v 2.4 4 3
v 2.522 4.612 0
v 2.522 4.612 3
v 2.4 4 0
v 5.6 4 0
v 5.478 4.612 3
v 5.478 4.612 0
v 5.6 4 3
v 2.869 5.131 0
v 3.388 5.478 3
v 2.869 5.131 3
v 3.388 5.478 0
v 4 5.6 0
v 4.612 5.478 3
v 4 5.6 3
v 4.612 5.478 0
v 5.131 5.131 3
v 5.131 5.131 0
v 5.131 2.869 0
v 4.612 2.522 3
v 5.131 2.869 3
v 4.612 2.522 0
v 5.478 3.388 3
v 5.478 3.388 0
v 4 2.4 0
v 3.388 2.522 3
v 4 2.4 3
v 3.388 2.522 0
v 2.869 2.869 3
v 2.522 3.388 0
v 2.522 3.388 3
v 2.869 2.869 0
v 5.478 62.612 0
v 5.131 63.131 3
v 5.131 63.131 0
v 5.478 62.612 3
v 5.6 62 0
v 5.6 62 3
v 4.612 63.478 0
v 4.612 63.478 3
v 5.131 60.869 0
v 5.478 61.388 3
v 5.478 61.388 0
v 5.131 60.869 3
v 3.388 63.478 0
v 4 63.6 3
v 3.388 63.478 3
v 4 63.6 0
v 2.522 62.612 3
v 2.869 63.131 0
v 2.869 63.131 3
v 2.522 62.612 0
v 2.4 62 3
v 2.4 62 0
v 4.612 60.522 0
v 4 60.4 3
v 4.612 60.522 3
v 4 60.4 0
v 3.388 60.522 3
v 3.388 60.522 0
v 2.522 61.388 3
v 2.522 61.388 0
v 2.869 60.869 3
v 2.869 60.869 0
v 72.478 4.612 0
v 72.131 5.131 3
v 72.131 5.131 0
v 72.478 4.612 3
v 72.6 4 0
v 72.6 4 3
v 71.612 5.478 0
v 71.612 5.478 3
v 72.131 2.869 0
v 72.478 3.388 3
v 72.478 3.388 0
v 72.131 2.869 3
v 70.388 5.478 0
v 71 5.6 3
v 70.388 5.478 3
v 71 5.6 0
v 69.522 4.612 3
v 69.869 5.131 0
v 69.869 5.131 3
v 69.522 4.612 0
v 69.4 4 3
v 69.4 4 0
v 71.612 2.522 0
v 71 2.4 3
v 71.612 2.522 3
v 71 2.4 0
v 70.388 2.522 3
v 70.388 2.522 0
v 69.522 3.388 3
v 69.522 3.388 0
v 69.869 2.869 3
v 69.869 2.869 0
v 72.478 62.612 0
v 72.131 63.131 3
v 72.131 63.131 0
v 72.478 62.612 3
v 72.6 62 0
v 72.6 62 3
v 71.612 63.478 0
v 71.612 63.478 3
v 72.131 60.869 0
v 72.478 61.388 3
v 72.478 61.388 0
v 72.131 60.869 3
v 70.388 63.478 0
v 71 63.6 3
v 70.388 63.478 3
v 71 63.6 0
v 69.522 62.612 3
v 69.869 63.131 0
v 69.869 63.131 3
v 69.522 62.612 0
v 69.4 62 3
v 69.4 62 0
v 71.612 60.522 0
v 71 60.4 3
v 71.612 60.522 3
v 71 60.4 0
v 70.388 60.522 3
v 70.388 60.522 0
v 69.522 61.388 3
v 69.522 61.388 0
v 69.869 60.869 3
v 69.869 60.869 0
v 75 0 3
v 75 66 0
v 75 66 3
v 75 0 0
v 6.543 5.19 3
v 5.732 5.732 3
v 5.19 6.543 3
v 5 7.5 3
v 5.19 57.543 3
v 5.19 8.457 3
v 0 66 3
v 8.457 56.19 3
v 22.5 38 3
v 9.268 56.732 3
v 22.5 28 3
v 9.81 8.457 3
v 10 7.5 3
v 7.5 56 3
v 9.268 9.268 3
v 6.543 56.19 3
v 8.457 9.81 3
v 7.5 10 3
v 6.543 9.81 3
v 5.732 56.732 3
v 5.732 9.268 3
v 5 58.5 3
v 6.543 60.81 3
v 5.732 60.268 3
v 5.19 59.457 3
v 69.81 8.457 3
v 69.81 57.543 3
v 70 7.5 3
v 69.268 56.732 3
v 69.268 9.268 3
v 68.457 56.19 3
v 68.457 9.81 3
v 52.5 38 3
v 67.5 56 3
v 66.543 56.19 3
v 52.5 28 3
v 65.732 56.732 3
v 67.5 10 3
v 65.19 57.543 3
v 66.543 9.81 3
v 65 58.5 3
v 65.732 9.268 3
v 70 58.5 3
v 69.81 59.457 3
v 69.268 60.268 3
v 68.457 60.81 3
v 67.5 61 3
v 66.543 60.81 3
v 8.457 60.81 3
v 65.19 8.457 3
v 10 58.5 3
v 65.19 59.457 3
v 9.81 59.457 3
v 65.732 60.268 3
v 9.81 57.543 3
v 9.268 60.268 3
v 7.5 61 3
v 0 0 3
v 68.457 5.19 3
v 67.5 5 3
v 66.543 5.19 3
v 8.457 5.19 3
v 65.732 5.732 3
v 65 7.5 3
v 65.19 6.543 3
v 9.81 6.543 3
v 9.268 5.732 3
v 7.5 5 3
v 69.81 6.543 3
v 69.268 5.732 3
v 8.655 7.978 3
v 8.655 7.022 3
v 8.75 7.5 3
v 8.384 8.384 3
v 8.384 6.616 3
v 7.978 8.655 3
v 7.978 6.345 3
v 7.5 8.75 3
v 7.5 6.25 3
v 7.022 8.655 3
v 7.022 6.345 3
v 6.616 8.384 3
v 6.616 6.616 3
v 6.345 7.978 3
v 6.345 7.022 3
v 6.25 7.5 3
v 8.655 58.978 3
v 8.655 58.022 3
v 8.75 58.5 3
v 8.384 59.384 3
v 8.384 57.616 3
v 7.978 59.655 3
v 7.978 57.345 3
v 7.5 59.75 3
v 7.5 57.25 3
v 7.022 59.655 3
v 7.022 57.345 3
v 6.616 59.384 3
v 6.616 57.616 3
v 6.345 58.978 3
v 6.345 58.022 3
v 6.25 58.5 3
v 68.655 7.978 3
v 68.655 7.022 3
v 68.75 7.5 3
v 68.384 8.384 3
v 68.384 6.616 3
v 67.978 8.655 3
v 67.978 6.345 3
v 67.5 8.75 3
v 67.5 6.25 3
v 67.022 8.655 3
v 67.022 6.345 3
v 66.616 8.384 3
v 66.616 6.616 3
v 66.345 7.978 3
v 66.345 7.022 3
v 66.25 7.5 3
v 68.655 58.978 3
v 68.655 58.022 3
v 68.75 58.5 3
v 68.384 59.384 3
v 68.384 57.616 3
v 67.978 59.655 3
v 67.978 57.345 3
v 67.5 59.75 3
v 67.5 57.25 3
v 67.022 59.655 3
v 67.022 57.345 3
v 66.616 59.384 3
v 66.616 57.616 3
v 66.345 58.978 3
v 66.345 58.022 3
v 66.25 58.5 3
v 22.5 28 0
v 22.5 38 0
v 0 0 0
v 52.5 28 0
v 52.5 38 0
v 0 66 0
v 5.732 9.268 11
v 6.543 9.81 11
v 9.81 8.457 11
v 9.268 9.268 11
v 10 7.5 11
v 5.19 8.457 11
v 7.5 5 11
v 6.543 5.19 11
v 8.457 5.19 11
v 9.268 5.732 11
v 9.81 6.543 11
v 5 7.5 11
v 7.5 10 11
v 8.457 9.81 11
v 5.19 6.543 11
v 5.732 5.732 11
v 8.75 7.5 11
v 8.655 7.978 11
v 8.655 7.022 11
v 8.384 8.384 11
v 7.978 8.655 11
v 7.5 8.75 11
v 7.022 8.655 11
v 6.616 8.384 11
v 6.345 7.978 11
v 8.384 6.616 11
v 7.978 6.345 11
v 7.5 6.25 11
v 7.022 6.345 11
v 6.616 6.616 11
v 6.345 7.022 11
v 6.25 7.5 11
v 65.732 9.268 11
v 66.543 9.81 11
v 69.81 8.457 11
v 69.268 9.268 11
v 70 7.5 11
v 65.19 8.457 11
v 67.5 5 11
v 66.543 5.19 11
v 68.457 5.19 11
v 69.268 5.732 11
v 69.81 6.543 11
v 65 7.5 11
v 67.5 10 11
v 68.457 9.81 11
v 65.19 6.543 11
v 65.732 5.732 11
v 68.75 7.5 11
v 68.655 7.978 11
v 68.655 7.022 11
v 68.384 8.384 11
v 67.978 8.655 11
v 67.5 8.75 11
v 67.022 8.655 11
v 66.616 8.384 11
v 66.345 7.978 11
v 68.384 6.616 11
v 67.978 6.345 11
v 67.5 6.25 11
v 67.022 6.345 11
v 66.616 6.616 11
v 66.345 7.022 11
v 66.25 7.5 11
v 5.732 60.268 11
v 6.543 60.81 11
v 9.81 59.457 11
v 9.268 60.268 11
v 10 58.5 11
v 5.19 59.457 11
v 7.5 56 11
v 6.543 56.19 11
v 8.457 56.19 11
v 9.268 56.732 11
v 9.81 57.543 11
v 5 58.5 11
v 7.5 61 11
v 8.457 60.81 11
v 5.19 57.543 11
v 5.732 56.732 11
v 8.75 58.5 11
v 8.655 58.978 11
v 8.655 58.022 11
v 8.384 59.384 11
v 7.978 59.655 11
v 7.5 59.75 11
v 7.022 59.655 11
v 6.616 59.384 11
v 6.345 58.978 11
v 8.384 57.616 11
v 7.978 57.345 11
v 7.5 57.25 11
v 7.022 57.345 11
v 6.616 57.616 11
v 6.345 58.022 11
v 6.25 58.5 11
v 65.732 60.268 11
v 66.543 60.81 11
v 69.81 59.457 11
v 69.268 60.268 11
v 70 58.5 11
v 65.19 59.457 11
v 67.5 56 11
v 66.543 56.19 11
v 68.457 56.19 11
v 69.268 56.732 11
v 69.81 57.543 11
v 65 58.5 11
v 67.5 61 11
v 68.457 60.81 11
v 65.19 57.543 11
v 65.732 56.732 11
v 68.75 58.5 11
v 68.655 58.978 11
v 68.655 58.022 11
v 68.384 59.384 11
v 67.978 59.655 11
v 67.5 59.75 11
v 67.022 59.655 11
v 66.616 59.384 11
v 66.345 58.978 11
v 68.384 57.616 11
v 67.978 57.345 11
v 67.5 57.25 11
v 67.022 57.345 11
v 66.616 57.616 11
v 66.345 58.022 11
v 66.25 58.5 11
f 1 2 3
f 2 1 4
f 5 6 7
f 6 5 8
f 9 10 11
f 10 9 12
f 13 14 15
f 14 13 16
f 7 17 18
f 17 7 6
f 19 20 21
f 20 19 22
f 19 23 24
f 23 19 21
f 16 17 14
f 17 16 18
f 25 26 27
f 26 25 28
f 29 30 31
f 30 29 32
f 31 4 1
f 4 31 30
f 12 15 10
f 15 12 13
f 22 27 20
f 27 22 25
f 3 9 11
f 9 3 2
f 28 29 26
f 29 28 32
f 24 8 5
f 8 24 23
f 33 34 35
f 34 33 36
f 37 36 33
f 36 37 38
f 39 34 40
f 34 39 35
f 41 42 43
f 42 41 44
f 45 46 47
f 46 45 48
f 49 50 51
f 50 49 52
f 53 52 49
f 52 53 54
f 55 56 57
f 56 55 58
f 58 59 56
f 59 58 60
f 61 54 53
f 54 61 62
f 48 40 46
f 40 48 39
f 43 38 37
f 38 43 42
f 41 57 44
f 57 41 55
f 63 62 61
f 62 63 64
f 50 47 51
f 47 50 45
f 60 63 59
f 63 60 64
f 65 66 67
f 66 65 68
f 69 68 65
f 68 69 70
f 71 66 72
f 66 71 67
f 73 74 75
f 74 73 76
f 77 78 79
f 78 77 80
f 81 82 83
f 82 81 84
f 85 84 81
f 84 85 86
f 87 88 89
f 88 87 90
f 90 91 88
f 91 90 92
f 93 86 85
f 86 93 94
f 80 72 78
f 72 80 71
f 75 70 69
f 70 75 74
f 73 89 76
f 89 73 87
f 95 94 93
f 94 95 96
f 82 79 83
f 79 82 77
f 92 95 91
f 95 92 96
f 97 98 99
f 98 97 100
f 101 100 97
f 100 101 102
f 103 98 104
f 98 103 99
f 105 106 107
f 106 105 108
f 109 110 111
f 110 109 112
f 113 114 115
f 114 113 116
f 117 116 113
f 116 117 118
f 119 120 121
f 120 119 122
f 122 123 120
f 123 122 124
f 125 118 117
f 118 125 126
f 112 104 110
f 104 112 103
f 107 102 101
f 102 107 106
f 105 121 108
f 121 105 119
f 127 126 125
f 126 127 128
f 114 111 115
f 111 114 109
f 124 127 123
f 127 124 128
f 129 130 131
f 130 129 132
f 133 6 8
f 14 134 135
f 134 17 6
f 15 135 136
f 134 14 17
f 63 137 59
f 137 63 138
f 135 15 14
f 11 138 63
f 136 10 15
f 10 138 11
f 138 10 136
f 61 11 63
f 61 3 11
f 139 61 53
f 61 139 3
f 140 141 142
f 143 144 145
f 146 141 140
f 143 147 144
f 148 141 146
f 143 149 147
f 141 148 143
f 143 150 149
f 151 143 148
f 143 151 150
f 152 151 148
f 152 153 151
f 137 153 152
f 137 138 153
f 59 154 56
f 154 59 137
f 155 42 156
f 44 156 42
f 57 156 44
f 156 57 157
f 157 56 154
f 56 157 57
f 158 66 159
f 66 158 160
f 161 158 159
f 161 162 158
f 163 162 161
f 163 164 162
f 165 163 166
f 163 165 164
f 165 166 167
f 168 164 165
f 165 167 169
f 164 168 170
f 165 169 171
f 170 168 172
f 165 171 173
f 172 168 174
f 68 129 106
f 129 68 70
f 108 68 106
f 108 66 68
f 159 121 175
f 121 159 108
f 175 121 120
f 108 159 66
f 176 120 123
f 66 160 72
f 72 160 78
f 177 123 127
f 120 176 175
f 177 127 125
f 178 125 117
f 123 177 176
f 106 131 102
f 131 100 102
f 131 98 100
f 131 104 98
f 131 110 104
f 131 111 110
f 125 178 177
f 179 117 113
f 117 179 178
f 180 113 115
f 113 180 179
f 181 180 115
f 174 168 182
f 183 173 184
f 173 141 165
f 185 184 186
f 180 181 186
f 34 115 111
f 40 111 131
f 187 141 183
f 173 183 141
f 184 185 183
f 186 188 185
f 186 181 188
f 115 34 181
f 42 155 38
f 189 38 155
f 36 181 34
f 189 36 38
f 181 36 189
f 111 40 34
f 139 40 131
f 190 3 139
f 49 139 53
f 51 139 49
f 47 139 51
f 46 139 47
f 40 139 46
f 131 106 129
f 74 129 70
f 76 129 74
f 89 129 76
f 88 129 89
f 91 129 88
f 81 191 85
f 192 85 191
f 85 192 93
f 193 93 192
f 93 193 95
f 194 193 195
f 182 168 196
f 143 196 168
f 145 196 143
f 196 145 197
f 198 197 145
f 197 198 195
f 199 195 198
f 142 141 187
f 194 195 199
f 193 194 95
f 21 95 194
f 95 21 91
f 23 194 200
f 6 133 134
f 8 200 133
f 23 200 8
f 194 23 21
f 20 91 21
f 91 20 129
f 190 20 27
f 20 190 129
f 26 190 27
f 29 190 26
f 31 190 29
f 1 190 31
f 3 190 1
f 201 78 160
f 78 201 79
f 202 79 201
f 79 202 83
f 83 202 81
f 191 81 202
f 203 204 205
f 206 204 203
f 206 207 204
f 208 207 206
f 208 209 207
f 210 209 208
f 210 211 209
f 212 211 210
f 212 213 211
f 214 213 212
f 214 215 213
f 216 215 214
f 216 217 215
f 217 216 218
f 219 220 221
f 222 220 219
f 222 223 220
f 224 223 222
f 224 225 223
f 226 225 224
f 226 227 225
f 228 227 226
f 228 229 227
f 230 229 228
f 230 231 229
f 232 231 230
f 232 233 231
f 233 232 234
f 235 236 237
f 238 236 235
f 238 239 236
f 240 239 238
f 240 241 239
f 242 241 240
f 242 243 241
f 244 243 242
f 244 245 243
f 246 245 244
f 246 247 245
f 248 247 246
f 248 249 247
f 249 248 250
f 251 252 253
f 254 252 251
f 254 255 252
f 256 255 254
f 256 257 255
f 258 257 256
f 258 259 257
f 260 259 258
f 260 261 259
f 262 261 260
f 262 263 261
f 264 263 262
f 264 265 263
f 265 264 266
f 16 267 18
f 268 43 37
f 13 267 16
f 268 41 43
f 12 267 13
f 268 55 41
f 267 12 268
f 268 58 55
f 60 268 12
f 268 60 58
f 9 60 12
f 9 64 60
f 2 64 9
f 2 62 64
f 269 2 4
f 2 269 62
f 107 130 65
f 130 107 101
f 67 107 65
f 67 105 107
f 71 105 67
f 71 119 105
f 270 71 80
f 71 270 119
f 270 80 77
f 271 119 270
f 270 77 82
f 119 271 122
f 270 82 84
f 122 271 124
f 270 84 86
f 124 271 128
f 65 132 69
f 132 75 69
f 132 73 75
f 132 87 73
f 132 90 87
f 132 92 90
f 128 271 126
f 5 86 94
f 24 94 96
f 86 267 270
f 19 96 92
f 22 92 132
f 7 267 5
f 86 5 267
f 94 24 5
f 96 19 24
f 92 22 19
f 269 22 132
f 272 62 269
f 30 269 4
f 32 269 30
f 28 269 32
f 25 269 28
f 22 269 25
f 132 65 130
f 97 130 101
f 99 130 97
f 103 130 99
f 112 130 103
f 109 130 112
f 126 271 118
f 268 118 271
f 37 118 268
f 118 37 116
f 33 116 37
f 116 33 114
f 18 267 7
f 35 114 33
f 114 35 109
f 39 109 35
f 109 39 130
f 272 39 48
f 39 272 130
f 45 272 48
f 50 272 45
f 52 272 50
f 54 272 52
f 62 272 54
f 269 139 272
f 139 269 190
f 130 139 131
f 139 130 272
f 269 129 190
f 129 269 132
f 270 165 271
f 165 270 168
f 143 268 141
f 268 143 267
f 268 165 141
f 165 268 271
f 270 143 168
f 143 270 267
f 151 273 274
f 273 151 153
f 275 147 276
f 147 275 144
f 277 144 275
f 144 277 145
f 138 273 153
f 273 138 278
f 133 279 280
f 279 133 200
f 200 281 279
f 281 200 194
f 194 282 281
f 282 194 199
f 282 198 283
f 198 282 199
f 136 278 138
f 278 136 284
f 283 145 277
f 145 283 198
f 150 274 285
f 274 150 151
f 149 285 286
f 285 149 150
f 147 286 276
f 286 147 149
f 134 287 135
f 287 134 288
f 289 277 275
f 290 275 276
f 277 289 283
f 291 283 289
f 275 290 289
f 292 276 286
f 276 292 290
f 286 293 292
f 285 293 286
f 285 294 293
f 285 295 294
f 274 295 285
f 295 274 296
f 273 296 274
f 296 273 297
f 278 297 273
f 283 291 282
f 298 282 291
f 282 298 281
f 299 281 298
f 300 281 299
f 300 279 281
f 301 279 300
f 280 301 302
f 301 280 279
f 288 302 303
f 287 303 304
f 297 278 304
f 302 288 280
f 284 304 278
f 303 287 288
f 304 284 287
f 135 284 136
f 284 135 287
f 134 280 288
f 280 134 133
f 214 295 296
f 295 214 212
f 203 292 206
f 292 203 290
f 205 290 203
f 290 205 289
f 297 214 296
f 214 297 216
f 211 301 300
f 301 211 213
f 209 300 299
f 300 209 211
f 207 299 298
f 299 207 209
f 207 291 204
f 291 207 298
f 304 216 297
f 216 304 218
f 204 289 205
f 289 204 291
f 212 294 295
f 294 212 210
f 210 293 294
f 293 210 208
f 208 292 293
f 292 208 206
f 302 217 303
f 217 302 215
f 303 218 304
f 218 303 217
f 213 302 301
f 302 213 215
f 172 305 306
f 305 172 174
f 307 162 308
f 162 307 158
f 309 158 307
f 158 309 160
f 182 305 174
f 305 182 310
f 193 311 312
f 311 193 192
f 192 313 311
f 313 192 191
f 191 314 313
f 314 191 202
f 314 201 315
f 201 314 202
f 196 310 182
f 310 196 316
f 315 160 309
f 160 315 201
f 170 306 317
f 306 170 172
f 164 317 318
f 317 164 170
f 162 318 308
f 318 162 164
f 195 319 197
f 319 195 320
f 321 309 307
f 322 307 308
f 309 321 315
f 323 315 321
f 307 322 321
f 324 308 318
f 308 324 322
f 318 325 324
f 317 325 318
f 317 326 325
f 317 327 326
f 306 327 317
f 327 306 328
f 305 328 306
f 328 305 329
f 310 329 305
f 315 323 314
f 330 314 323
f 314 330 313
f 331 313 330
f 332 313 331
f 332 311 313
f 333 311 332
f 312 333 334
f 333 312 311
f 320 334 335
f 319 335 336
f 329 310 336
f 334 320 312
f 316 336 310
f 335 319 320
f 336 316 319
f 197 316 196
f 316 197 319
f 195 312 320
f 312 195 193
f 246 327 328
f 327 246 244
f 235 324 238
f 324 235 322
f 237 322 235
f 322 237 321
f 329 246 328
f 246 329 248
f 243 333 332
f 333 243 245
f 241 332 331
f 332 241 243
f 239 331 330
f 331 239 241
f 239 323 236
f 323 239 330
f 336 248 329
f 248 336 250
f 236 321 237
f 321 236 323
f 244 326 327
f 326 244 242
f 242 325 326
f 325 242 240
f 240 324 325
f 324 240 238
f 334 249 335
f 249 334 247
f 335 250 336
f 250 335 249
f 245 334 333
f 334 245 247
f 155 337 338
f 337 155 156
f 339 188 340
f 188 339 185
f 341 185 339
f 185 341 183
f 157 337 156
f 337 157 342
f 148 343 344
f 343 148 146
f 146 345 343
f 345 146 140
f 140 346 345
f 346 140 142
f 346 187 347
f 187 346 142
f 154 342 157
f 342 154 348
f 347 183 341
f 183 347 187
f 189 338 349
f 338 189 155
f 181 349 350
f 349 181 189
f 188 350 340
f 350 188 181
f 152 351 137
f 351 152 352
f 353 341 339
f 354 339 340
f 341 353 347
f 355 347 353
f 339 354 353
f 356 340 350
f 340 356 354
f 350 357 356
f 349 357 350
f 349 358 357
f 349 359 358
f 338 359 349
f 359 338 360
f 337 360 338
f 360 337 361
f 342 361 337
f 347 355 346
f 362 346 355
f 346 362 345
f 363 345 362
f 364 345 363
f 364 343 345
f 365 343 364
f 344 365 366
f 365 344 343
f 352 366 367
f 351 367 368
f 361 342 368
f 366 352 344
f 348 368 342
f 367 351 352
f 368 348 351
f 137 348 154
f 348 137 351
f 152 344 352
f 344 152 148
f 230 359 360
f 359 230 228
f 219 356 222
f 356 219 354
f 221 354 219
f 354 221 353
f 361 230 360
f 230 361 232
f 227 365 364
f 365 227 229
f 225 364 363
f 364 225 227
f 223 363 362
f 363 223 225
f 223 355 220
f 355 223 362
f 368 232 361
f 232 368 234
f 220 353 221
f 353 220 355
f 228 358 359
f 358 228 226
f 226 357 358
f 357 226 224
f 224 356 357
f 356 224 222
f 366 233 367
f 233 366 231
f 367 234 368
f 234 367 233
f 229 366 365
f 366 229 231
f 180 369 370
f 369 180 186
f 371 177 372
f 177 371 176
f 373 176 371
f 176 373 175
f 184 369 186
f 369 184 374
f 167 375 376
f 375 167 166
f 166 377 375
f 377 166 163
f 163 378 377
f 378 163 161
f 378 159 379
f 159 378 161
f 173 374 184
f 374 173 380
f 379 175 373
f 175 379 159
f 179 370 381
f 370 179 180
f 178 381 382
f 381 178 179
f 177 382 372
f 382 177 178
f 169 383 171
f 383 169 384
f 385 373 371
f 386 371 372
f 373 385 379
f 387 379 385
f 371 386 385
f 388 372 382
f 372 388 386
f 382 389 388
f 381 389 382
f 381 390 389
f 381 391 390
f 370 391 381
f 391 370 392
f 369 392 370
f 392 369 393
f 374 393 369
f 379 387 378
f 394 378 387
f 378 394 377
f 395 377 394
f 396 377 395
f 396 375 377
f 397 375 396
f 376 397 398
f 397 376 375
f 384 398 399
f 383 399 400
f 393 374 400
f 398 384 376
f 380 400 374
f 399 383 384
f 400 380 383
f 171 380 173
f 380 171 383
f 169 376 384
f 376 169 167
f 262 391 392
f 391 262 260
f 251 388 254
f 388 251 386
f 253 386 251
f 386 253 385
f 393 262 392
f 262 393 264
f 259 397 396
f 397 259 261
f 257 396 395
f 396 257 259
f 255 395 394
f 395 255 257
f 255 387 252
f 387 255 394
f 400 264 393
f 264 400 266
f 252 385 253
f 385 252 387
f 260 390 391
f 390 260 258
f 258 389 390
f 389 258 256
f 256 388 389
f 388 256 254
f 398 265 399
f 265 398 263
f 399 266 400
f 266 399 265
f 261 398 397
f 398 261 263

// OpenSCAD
// =============================================================================
// ISKANDER HEARTH — Solidarity HAT Mounting Bracket v1
// File: sensor_hat_bracket.scad
// =============================================================================
// License : CERN Open Hardware Licence v2 – Strongly Reciprocal (CERN-OHL-S)
// Phase   : 6 — Glass Box Physical UX (referenced from Phase 5 assembly guide)
//
// PCB mounting bracket for the Solidarity HAT (65×56mm, 2-layer FR4).
// Mounts to the chassis interior right side panel using M3 screws.
// PCB retained by M3×5mm standoffs at four corners.
//
// HAT PCB MOUNTING HOLES: 4× M3, 2.5mm from each PCB edge corner.
//   Hole A: (2.5, 2.5)
//   Hole B: (62.5, 2.5)
//   Hole C: (2.5, 53.5)
//   Hole D: (62.5, 53.5)
//
// PRINT SETTINGS: 3 perimeters, 40% gyroid infill, 0.2mm layer, PETG
// =============================================================================


// =============================================================================
// SECTION 1 — PARAMETERS
// =============================================================================

// --- HAT PCB dimensions ---
hat_pcb_w    = 65.0;    // [mm] Solidarity HAT width
hat_pcb_d    = 56.0;    // [mm] Solidarity HAT depth
hat_pcb_t    = 1.6;     // [mm] PCB thickness (standard FR4)
hat_hole_d   = 3.2;     // [mm] M3 clearance hole diameter
hat_hole_inset = 2.5;   // [mm] Hole distance from PCB edge

// --- Standoff ---
standoff_h   = 8.0;     // [mm] PCB standoff height (clears J1 through-hole pins below)
standoff_od  = 5.0;     // [mm] Standoff outer diameter

// --- Bracket base plate ---
base_t       = 3.0;     // [mm] Base plate thickness
base_margin  = 5.0;     // [mm] Margin around PCB footprint
base_w       = hat_pcb_w + base_margin * 2;
base_d       = hat_pcb_d + base_margin * 2;

// --- Chassis mounting holes (for screwing bracket to side panel) ---
chassis_hole_d = 3.2;   // [mm] M3 clearance
chassis_hole_spacing_w = base_w - 8;  // [mm] Horizontal span
chassis_hole_spacing_d = base_d - 8;  // [mm] Vertical span

// --- Fit tolerance ---
fit_t        = 0.4;


// =============================================================================
// SECTION 2 — MODULE
// =============================================================================

module solidarity_hat_bracket() {
    // PCB mounting hole positions relative to bracket origin (at base_margin offset)
    holes = [
        [hat_hole_inset + base_margin, hat_hole_inset + base_margin],
        [hat_pcb_w - hat_hole_inset + base_margin, hat_hole_inset + base_margin],
        [hat_hole_inset + base_margin, hat_pcb_d - hat_hole_inset + base_margin],
        [hat_pcb_w - hat_hole_inset + base_margin, hat_pcb_d - hat_hole_inset + base_margin],
    ];

    difference() {
        // Base plate
        cube([base_w, base_d, base_t]);

        // Chassis mounting holes (corner positions)
        for (x_off = [4, base_w - 4]) {
            for (y_off = [4, base_d - 4]) {
                translate([x_off, y_off, -0.1])
                cylinder(d = chassis_hole_d, h = base_t + 0.2, $fn = 16);
            }
        }

        // Cable pass-through slot (for I2C/GPIO wiring to J1)
        // Centred in bracket, wide enough for 2×20 connector cable bundle
        translate([base_w / 2 - 15, base_d / 2 - 5, -0.1])
        cube([30, 10, base_t + 0.2]);
    }

    // PCB standoffs at each hole position
    for (pos = holes) {
        translate([pos[0], pos[1], base_t])
        difference() {
            cylinder(d = standoff_od, h = standoff_h, $fn = 16);
            // M3 thread hole (tap M3 after printing, or use heat-set M3 insert)
            translate([0, 0, -0.1])
            cylinder(d = 2.5, h = standoff_h + 0.2, $fn = 16);  // 2.5mm = M3 tap drill
        }
    }
}


// =============================================================================
// SECTION 3 — RENDER
// =============================================================================

solidarity_hat_bracket();

// HAT ghost (for clearance check):
// %translate([base_margin, base_margin, base_t + standoff_h])
//   cube([hat_pcb_w, hat_pcb_d, hat_pcb_t]);
